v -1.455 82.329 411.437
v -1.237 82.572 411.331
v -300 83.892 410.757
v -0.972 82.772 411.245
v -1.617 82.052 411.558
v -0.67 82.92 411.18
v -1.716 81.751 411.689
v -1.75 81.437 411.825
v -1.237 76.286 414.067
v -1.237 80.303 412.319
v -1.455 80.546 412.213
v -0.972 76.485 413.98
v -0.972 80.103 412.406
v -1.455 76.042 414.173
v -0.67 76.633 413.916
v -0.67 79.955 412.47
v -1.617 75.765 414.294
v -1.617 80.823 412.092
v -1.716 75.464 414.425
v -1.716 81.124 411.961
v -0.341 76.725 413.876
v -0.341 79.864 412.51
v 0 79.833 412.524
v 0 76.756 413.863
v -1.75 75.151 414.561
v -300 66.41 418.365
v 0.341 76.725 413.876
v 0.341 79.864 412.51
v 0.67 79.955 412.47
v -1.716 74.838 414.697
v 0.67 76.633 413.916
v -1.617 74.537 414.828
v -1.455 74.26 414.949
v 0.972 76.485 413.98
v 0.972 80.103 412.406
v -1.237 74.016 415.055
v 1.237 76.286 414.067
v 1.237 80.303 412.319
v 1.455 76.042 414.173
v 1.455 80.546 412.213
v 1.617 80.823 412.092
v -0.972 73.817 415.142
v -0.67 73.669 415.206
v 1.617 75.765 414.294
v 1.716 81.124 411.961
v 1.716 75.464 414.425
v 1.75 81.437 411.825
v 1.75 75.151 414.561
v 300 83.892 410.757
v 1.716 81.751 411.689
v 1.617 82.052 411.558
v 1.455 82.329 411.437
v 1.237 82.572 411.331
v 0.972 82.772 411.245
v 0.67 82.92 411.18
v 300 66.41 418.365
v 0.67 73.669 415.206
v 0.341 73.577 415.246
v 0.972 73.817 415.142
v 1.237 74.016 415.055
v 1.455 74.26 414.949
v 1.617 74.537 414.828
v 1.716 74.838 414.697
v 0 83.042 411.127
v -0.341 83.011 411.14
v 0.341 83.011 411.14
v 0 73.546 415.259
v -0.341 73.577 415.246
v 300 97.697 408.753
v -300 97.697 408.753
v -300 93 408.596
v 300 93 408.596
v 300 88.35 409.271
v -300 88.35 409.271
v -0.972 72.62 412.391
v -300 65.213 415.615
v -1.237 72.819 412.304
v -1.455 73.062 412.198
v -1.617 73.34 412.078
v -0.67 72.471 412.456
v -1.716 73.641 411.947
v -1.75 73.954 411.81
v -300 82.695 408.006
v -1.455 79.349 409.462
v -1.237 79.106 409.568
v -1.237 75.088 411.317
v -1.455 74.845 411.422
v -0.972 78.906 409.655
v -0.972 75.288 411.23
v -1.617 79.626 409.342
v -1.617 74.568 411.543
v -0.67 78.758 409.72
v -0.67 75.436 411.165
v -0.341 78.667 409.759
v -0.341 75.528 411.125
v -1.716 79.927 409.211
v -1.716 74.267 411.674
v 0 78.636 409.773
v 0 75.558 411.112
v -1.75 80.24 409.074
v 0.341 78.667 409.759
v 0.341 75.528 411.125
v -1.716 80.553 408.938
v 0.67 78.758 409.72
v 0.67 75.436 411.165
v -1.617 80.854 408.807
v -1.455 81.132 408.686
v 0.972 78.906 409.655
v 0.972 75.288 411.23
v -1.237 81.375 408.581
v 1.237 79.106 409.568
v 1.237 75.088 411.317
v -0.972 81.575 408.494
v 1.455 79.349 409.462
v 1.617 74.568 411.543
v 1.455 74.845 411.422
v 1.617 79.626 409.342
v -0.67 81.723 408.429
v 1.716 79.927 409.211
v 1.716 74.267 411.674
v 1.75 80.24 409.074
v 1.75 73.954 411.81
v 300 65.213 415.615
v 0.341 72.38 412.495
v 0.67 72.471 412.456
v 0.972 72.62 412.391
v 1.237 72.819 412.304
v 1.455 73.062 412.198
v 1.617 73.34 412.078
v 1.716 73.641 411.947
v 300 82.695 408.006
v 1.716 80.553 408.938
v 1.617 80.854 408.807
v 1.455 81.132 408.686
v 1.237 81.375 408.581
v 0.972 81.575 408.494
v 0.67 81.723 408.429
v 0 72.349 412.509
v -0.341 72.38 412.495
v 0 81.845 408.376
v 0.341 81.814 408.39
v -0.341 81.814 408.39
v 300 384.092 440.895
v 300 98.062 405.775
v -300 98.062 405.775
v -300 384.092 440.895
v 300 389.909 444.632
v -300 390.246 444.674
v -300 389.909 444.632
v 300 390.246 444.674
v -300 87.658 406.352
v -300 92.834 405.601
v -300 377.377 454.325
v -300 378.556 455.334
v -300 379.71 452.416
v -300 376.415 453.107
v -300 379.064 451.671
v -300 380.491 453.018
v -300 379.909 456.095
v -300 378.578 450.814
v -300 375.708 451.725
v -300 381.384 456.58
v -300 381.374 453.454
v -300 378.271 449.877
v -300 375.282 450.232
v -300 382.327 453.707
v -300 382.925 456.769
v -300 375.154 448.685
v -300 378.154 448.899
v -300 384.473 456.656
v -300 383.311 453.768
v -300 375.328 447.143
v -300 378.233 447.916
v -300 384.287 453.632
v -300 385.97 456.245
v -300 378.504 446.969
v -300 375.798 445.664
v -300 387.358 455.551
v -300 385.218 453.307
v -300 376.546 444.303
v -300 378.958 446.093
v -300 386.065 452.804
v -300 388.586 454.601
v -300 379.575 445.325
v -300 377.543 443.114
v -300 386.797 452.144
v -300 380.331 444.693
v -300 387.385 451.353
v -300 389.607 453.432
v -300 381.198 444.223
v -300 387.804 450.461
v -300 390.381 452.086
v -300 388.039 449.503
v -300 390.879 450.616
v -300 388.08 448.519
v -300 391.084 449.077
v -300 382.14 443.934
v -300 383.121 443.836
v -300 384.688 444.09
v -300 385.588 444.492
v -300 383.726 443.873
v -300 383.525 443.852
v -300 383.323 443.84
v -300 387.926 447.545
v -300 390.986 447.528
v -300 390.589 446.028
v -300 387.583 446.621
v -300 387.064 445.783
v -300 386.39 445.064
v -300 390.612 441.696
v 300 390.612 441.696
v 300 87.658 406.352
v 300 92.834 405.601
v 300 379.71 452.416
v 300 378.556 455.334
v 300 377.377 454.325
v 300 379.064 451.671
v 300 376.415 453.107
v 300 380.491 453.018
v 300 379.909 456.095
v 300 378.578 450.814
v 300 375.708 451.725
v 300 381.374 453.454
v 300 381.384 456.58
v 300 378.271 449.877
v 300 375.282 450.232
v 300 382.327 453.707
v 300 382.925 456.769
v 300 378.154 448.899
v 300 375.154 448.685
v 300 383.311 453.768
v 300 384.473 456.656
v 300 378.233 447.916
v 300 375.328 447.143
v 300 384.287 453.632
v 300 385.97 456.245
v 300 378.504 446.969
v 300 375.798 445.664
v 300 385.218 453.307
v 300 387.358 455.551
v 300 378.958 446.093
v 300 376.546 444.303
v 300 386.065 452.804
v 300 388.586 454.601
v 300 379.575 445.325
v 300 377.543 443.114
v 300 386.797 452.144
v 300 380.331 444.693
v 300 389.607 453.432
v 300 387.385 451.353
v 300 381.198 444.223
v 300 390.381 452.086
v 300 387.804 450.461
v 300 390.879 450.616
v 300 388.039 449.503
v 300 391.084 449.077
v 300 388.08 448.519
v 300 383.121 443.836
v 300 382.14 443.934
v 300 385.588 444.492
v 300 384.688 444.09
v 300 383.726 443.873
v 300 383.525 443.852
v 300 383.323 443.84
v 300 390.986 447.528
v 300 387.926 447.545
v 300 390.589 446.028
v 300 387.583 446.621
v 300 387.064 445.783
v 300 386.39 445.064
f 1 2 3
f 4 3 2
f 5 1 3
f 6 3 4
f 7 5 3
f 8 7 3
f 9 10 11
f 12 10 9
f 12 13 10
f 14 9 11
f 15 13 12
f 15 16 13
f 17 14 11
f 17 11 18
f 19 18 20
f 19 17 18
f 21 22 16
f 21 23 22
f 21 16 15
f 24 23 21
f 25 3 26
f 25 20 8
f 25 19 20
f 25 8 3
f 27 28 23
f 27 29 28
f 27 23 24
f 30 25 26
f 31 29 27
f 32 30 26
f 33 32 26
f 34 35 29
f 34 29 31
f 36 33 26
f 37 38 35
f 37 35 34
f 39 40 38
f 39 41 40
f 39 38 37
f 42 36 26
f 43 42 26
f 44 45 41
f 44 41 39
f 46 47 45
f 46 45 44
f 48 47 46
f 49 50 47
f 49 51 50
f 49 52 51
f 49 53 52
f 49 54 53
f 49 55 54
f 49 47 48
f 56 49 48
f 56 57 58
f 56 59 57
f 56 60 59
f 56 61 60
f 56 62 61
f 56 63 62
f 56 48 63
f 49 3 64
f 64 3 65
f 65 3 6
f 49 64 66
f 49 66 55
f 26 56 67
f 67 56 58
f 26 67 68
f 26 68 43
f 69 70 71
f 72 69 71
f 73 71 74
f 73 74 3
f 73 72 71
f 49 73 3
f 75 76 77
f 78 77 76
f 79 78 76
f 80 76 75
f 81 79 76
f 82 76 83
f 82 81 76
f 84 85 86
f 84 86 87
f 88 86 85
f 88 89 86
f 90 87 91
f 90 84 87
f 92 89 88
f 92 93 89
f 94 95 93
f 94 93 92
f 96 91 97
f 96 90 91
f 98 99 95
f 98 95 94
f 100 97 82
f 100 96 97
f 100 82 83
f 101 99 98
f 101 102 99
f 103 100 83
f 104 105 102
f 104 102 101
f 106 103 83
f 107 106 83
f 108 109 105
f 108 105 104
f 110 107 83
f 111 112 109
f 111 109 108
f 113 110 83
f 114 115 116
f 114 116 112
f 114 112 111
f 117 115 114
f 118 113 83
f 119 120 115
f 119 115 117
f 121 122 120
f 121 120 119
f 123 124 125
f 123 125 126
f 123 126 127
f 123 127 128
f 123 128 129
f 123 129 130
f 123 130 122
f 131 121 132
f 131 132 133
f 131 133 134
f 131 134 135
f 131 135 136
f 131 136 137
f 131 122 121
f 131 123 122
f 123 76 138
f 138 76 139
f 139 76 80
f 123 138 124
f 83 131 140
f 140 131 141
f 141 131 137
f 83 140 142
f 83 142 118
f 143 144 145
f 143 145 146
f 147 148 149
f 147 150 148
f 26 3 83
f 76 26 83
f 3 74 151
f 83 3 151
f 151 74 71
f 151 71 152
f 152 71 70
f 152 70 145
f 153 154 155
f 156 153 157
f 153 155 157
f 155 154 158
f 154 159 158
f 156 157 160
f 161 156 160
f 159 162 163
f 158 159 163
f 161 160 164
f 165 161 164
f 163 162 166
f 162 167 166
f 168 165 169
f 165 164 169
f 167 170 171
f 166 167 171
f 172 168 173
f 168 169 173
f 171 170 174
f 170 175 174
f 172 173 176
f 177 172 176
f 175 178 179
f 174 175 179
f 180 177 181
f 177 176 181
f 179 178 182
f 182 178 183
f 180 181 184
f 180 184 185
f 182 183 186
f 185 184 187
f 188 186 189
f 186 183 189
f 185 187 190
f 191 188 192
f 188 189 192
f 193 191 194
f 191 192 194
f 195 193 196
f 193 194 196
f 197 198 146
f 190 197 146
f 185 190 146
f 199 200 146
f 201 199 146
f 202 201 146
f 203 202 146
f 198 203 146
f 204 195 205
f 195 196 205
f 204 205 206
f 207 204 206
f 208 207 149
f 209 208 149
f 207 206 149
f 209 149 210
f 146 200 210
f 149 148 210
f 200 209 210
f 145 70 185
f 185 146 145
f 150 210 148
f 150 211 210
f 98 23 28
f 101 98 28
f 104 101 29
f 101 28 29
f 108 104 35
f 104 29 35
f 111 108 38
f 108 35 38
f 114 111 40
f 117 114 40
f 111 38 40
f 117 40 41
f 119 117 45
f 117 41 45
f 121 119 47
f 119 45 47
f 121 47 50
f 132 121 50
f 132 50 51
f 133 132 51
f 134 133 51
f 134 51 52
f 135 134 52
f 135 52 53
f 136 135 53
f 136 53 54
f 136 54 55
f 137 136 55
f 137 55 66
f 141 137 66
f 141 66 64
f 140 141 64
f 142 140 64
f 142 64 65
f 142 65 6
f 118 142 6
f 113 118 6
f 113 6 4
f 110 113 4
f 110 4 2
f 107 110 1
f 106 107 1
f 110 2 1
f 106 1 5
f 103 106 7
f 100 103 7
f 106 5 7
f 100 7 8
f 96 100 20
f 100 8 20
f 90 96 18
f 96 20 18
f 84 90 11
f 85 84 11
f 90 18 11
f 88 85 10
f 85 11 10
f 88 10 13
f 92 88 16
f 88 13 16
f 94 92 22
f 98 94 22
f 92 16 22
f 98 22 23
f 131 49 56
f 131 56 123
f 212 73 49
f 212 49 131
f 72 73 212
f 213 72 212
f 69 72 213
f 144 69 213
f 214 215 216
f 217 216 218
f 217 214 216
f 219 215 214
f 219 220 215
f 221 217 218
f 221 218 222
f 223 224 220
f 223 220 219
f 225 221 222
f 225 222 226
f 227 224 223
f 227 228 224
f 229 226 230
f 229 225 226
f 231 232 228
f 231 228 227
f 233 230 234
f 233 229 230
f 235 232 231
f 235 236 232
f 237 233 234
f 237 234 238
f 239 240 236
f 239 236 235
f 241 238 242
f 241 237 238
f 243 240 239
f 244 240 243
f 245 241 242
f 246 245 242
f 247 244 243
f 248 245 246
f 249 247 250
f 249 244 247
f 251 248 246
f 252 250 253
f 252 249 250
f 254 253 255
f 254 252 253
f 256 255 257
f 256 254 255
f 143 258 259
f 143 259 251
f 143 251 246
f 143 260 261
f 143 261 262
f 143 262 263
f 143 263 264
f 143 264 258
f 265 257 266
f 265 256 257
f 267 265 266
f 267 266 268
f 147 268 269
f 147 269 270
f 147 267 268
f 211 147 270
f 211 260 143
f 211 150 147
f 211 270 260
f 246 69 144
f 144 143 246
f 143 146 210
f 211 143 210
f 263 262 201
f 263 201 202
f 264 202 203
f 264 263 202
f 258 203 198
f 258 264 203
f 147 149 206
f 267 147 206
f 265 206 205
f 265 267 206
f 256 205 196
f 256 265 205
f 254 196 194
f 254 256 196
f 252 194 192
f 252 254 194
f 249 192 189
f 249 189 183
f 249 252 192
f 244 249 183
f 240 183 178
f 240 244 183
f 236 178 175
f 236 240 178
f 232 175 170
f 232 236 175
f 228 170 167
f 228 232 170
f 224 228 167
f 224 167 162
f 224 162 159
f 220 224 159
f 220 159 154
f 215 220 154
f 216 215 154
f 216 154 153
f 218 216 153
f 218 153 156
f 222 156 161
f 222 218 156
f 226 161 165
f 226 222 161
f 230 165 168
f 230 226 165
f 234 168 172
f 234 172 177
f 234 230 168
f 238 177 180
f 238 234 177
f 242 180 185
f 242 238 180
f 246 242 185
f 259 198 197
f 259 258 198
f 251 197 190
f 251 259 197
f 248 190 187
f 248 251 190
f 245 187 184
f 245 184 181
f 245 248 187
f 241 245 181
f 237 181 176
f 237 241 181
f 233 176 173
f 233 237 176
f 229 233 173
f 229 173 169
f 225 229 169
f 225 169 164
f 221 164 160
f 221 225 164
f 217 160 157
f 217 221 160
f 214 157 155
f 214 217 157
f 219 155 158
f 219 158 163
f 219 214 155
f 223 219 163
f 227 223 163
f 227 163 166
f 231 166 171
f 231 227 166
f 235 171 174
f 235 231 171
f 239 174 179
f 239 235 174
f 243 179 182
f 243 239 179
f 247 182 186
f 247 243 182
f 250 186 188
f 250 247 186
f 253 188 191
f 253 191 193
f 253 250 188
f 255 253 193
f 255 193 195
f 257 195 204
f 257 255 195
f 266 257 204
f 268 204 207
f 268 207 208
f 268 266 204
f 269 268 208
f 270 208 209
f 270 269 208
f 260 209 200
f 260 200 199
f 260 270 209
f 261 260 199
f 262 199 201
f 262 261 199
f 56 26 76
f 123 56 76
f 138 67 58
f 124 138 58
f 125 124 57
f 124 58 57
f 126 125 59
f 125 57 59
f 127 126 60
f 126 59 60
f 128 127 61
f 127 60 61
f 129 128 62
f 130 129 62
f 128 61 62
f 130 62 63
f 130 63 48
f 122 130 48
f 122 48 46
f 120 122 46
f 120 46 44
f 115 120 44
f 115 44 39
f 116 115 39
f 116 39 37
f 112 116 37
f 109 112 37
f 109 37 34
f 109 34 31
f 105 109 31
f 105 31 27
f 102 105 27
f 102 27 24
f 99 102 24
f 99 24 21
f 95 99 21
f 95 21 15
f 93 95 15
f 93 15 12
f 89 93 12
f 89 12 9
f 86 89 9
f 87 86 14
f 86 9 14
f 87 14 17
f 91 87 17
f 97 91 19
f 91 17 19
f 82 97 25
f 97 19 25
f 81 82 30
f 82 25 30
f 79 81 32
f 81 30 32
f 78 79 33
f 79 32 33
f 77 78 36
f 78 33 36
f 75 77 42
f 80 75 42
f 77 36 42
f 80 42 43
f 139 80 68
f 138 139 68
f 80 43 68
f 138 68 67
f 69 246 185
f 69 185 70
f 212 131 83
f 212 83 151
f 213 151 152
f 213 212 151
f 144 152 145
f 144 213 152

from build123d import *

# Parameters (mm, degrees)
SKETCH2_R        = 4.967627027
MAIN_DEPTH       = 300
SCREW_HOLE_REACH = 387.023
SKETCH3_R        = 1.75


with BuildPart() as part:
    # Sketch2 → Main (new, symmetric)
    with BuildSketch(Plane(origin=(0, 0, 0), x_dir=(0, 0, -1), z_dir=(1, 0, 0))):
        with BuildLine():
            Line((-418.365390033, 66.409688449), (-415.614602943, 65.212537504))
            Line((-415.614602943, 65.212537504), (-408.006110333, 82.695164353))
            ThreePointArc((-408.006110333, 82.695164353), (-405.861496509, 90.229320908), (-405.775405247, 98.062294273))
            Line((-405.775405247, 98.062294273), (-441.695942664, 390.611594874))
            Line((-441.695942664, 390.611594874), (-444.673581118, 390.245986843))
            Line((-444.673581118, 390.245986843), (-444.632221398, 389.90913895))
            ThreePointArc((-444.632221398, 389.90913895), (-456.711881838, 382.149734123), (-443.113869014, 377.543151133))
            Line((-443.113869014, 377.543151133), (-408.753043702, 97.696686242))
            ThreePointArc((-408.753043702, 97.696686242), (-408.83037992, 90.66028644), (-410.756897423, 83.892315298))
            Line((-410.756897423, 83.892315298), (-418.365390033, 66.409688449))
        make_face()
        with Locations((-448.803644294, 383.120743597)):
            Circle(SKETCH2_R, mode=Mode.SUBTRACT)
    extrude(amount=MAIN_DEPTH, both=True)

    # Sketch3 → Screw Hole (cut, up to next)
    with BuildSketch(Plane(origin=(0, 163.655393922, 376.043761949), x_dir=(1, 0, 0), z_dir=(0, 0.3990503148824781, 0.9169290300738631)), mode=Mode.PRIVATE) as screw_hole_sk1:
        with Locations((0, -96.522619686)):
            Circle(SKETCH3_R)
    screw_hole_tool1 = extrude(screw_hole_sk1.sketch, amount=-SCREW_HOLE_REACH, mode=Mode.PRIVATE) & part.part
    # Sketch3 → Screw Hole (cut, up to next)
    with BuildSketch(Plane(origin=(0, 163.655393922, 376.043761949), x_dir=(1, 0, 0), z_dir=(0, 0.3990503148824781, 0.9169290300738631)), mode=Mode.PRIVATE) as screw_hole_sk2:
        with Locations((0, -89.666587201)):
            Circle(SKETCH3_R)
    screw_hole_tool2 = extrude(screw_hole_sk2.sketch, amount=-SCREW_HOLE_REACH, mode=Mode.PRIVATE) & part.part
    add(screw_hole_tool1.solids().sort_by_distance((0, 75.151002, 414.561144))[0], mode=Mode.SUBTRACT)
    add(screw_hole_tool2.solids().sort_by_distance((0, 81.437497, 411.825242))[0], mode=Mode.SUBTRACT)


solid = part.part
